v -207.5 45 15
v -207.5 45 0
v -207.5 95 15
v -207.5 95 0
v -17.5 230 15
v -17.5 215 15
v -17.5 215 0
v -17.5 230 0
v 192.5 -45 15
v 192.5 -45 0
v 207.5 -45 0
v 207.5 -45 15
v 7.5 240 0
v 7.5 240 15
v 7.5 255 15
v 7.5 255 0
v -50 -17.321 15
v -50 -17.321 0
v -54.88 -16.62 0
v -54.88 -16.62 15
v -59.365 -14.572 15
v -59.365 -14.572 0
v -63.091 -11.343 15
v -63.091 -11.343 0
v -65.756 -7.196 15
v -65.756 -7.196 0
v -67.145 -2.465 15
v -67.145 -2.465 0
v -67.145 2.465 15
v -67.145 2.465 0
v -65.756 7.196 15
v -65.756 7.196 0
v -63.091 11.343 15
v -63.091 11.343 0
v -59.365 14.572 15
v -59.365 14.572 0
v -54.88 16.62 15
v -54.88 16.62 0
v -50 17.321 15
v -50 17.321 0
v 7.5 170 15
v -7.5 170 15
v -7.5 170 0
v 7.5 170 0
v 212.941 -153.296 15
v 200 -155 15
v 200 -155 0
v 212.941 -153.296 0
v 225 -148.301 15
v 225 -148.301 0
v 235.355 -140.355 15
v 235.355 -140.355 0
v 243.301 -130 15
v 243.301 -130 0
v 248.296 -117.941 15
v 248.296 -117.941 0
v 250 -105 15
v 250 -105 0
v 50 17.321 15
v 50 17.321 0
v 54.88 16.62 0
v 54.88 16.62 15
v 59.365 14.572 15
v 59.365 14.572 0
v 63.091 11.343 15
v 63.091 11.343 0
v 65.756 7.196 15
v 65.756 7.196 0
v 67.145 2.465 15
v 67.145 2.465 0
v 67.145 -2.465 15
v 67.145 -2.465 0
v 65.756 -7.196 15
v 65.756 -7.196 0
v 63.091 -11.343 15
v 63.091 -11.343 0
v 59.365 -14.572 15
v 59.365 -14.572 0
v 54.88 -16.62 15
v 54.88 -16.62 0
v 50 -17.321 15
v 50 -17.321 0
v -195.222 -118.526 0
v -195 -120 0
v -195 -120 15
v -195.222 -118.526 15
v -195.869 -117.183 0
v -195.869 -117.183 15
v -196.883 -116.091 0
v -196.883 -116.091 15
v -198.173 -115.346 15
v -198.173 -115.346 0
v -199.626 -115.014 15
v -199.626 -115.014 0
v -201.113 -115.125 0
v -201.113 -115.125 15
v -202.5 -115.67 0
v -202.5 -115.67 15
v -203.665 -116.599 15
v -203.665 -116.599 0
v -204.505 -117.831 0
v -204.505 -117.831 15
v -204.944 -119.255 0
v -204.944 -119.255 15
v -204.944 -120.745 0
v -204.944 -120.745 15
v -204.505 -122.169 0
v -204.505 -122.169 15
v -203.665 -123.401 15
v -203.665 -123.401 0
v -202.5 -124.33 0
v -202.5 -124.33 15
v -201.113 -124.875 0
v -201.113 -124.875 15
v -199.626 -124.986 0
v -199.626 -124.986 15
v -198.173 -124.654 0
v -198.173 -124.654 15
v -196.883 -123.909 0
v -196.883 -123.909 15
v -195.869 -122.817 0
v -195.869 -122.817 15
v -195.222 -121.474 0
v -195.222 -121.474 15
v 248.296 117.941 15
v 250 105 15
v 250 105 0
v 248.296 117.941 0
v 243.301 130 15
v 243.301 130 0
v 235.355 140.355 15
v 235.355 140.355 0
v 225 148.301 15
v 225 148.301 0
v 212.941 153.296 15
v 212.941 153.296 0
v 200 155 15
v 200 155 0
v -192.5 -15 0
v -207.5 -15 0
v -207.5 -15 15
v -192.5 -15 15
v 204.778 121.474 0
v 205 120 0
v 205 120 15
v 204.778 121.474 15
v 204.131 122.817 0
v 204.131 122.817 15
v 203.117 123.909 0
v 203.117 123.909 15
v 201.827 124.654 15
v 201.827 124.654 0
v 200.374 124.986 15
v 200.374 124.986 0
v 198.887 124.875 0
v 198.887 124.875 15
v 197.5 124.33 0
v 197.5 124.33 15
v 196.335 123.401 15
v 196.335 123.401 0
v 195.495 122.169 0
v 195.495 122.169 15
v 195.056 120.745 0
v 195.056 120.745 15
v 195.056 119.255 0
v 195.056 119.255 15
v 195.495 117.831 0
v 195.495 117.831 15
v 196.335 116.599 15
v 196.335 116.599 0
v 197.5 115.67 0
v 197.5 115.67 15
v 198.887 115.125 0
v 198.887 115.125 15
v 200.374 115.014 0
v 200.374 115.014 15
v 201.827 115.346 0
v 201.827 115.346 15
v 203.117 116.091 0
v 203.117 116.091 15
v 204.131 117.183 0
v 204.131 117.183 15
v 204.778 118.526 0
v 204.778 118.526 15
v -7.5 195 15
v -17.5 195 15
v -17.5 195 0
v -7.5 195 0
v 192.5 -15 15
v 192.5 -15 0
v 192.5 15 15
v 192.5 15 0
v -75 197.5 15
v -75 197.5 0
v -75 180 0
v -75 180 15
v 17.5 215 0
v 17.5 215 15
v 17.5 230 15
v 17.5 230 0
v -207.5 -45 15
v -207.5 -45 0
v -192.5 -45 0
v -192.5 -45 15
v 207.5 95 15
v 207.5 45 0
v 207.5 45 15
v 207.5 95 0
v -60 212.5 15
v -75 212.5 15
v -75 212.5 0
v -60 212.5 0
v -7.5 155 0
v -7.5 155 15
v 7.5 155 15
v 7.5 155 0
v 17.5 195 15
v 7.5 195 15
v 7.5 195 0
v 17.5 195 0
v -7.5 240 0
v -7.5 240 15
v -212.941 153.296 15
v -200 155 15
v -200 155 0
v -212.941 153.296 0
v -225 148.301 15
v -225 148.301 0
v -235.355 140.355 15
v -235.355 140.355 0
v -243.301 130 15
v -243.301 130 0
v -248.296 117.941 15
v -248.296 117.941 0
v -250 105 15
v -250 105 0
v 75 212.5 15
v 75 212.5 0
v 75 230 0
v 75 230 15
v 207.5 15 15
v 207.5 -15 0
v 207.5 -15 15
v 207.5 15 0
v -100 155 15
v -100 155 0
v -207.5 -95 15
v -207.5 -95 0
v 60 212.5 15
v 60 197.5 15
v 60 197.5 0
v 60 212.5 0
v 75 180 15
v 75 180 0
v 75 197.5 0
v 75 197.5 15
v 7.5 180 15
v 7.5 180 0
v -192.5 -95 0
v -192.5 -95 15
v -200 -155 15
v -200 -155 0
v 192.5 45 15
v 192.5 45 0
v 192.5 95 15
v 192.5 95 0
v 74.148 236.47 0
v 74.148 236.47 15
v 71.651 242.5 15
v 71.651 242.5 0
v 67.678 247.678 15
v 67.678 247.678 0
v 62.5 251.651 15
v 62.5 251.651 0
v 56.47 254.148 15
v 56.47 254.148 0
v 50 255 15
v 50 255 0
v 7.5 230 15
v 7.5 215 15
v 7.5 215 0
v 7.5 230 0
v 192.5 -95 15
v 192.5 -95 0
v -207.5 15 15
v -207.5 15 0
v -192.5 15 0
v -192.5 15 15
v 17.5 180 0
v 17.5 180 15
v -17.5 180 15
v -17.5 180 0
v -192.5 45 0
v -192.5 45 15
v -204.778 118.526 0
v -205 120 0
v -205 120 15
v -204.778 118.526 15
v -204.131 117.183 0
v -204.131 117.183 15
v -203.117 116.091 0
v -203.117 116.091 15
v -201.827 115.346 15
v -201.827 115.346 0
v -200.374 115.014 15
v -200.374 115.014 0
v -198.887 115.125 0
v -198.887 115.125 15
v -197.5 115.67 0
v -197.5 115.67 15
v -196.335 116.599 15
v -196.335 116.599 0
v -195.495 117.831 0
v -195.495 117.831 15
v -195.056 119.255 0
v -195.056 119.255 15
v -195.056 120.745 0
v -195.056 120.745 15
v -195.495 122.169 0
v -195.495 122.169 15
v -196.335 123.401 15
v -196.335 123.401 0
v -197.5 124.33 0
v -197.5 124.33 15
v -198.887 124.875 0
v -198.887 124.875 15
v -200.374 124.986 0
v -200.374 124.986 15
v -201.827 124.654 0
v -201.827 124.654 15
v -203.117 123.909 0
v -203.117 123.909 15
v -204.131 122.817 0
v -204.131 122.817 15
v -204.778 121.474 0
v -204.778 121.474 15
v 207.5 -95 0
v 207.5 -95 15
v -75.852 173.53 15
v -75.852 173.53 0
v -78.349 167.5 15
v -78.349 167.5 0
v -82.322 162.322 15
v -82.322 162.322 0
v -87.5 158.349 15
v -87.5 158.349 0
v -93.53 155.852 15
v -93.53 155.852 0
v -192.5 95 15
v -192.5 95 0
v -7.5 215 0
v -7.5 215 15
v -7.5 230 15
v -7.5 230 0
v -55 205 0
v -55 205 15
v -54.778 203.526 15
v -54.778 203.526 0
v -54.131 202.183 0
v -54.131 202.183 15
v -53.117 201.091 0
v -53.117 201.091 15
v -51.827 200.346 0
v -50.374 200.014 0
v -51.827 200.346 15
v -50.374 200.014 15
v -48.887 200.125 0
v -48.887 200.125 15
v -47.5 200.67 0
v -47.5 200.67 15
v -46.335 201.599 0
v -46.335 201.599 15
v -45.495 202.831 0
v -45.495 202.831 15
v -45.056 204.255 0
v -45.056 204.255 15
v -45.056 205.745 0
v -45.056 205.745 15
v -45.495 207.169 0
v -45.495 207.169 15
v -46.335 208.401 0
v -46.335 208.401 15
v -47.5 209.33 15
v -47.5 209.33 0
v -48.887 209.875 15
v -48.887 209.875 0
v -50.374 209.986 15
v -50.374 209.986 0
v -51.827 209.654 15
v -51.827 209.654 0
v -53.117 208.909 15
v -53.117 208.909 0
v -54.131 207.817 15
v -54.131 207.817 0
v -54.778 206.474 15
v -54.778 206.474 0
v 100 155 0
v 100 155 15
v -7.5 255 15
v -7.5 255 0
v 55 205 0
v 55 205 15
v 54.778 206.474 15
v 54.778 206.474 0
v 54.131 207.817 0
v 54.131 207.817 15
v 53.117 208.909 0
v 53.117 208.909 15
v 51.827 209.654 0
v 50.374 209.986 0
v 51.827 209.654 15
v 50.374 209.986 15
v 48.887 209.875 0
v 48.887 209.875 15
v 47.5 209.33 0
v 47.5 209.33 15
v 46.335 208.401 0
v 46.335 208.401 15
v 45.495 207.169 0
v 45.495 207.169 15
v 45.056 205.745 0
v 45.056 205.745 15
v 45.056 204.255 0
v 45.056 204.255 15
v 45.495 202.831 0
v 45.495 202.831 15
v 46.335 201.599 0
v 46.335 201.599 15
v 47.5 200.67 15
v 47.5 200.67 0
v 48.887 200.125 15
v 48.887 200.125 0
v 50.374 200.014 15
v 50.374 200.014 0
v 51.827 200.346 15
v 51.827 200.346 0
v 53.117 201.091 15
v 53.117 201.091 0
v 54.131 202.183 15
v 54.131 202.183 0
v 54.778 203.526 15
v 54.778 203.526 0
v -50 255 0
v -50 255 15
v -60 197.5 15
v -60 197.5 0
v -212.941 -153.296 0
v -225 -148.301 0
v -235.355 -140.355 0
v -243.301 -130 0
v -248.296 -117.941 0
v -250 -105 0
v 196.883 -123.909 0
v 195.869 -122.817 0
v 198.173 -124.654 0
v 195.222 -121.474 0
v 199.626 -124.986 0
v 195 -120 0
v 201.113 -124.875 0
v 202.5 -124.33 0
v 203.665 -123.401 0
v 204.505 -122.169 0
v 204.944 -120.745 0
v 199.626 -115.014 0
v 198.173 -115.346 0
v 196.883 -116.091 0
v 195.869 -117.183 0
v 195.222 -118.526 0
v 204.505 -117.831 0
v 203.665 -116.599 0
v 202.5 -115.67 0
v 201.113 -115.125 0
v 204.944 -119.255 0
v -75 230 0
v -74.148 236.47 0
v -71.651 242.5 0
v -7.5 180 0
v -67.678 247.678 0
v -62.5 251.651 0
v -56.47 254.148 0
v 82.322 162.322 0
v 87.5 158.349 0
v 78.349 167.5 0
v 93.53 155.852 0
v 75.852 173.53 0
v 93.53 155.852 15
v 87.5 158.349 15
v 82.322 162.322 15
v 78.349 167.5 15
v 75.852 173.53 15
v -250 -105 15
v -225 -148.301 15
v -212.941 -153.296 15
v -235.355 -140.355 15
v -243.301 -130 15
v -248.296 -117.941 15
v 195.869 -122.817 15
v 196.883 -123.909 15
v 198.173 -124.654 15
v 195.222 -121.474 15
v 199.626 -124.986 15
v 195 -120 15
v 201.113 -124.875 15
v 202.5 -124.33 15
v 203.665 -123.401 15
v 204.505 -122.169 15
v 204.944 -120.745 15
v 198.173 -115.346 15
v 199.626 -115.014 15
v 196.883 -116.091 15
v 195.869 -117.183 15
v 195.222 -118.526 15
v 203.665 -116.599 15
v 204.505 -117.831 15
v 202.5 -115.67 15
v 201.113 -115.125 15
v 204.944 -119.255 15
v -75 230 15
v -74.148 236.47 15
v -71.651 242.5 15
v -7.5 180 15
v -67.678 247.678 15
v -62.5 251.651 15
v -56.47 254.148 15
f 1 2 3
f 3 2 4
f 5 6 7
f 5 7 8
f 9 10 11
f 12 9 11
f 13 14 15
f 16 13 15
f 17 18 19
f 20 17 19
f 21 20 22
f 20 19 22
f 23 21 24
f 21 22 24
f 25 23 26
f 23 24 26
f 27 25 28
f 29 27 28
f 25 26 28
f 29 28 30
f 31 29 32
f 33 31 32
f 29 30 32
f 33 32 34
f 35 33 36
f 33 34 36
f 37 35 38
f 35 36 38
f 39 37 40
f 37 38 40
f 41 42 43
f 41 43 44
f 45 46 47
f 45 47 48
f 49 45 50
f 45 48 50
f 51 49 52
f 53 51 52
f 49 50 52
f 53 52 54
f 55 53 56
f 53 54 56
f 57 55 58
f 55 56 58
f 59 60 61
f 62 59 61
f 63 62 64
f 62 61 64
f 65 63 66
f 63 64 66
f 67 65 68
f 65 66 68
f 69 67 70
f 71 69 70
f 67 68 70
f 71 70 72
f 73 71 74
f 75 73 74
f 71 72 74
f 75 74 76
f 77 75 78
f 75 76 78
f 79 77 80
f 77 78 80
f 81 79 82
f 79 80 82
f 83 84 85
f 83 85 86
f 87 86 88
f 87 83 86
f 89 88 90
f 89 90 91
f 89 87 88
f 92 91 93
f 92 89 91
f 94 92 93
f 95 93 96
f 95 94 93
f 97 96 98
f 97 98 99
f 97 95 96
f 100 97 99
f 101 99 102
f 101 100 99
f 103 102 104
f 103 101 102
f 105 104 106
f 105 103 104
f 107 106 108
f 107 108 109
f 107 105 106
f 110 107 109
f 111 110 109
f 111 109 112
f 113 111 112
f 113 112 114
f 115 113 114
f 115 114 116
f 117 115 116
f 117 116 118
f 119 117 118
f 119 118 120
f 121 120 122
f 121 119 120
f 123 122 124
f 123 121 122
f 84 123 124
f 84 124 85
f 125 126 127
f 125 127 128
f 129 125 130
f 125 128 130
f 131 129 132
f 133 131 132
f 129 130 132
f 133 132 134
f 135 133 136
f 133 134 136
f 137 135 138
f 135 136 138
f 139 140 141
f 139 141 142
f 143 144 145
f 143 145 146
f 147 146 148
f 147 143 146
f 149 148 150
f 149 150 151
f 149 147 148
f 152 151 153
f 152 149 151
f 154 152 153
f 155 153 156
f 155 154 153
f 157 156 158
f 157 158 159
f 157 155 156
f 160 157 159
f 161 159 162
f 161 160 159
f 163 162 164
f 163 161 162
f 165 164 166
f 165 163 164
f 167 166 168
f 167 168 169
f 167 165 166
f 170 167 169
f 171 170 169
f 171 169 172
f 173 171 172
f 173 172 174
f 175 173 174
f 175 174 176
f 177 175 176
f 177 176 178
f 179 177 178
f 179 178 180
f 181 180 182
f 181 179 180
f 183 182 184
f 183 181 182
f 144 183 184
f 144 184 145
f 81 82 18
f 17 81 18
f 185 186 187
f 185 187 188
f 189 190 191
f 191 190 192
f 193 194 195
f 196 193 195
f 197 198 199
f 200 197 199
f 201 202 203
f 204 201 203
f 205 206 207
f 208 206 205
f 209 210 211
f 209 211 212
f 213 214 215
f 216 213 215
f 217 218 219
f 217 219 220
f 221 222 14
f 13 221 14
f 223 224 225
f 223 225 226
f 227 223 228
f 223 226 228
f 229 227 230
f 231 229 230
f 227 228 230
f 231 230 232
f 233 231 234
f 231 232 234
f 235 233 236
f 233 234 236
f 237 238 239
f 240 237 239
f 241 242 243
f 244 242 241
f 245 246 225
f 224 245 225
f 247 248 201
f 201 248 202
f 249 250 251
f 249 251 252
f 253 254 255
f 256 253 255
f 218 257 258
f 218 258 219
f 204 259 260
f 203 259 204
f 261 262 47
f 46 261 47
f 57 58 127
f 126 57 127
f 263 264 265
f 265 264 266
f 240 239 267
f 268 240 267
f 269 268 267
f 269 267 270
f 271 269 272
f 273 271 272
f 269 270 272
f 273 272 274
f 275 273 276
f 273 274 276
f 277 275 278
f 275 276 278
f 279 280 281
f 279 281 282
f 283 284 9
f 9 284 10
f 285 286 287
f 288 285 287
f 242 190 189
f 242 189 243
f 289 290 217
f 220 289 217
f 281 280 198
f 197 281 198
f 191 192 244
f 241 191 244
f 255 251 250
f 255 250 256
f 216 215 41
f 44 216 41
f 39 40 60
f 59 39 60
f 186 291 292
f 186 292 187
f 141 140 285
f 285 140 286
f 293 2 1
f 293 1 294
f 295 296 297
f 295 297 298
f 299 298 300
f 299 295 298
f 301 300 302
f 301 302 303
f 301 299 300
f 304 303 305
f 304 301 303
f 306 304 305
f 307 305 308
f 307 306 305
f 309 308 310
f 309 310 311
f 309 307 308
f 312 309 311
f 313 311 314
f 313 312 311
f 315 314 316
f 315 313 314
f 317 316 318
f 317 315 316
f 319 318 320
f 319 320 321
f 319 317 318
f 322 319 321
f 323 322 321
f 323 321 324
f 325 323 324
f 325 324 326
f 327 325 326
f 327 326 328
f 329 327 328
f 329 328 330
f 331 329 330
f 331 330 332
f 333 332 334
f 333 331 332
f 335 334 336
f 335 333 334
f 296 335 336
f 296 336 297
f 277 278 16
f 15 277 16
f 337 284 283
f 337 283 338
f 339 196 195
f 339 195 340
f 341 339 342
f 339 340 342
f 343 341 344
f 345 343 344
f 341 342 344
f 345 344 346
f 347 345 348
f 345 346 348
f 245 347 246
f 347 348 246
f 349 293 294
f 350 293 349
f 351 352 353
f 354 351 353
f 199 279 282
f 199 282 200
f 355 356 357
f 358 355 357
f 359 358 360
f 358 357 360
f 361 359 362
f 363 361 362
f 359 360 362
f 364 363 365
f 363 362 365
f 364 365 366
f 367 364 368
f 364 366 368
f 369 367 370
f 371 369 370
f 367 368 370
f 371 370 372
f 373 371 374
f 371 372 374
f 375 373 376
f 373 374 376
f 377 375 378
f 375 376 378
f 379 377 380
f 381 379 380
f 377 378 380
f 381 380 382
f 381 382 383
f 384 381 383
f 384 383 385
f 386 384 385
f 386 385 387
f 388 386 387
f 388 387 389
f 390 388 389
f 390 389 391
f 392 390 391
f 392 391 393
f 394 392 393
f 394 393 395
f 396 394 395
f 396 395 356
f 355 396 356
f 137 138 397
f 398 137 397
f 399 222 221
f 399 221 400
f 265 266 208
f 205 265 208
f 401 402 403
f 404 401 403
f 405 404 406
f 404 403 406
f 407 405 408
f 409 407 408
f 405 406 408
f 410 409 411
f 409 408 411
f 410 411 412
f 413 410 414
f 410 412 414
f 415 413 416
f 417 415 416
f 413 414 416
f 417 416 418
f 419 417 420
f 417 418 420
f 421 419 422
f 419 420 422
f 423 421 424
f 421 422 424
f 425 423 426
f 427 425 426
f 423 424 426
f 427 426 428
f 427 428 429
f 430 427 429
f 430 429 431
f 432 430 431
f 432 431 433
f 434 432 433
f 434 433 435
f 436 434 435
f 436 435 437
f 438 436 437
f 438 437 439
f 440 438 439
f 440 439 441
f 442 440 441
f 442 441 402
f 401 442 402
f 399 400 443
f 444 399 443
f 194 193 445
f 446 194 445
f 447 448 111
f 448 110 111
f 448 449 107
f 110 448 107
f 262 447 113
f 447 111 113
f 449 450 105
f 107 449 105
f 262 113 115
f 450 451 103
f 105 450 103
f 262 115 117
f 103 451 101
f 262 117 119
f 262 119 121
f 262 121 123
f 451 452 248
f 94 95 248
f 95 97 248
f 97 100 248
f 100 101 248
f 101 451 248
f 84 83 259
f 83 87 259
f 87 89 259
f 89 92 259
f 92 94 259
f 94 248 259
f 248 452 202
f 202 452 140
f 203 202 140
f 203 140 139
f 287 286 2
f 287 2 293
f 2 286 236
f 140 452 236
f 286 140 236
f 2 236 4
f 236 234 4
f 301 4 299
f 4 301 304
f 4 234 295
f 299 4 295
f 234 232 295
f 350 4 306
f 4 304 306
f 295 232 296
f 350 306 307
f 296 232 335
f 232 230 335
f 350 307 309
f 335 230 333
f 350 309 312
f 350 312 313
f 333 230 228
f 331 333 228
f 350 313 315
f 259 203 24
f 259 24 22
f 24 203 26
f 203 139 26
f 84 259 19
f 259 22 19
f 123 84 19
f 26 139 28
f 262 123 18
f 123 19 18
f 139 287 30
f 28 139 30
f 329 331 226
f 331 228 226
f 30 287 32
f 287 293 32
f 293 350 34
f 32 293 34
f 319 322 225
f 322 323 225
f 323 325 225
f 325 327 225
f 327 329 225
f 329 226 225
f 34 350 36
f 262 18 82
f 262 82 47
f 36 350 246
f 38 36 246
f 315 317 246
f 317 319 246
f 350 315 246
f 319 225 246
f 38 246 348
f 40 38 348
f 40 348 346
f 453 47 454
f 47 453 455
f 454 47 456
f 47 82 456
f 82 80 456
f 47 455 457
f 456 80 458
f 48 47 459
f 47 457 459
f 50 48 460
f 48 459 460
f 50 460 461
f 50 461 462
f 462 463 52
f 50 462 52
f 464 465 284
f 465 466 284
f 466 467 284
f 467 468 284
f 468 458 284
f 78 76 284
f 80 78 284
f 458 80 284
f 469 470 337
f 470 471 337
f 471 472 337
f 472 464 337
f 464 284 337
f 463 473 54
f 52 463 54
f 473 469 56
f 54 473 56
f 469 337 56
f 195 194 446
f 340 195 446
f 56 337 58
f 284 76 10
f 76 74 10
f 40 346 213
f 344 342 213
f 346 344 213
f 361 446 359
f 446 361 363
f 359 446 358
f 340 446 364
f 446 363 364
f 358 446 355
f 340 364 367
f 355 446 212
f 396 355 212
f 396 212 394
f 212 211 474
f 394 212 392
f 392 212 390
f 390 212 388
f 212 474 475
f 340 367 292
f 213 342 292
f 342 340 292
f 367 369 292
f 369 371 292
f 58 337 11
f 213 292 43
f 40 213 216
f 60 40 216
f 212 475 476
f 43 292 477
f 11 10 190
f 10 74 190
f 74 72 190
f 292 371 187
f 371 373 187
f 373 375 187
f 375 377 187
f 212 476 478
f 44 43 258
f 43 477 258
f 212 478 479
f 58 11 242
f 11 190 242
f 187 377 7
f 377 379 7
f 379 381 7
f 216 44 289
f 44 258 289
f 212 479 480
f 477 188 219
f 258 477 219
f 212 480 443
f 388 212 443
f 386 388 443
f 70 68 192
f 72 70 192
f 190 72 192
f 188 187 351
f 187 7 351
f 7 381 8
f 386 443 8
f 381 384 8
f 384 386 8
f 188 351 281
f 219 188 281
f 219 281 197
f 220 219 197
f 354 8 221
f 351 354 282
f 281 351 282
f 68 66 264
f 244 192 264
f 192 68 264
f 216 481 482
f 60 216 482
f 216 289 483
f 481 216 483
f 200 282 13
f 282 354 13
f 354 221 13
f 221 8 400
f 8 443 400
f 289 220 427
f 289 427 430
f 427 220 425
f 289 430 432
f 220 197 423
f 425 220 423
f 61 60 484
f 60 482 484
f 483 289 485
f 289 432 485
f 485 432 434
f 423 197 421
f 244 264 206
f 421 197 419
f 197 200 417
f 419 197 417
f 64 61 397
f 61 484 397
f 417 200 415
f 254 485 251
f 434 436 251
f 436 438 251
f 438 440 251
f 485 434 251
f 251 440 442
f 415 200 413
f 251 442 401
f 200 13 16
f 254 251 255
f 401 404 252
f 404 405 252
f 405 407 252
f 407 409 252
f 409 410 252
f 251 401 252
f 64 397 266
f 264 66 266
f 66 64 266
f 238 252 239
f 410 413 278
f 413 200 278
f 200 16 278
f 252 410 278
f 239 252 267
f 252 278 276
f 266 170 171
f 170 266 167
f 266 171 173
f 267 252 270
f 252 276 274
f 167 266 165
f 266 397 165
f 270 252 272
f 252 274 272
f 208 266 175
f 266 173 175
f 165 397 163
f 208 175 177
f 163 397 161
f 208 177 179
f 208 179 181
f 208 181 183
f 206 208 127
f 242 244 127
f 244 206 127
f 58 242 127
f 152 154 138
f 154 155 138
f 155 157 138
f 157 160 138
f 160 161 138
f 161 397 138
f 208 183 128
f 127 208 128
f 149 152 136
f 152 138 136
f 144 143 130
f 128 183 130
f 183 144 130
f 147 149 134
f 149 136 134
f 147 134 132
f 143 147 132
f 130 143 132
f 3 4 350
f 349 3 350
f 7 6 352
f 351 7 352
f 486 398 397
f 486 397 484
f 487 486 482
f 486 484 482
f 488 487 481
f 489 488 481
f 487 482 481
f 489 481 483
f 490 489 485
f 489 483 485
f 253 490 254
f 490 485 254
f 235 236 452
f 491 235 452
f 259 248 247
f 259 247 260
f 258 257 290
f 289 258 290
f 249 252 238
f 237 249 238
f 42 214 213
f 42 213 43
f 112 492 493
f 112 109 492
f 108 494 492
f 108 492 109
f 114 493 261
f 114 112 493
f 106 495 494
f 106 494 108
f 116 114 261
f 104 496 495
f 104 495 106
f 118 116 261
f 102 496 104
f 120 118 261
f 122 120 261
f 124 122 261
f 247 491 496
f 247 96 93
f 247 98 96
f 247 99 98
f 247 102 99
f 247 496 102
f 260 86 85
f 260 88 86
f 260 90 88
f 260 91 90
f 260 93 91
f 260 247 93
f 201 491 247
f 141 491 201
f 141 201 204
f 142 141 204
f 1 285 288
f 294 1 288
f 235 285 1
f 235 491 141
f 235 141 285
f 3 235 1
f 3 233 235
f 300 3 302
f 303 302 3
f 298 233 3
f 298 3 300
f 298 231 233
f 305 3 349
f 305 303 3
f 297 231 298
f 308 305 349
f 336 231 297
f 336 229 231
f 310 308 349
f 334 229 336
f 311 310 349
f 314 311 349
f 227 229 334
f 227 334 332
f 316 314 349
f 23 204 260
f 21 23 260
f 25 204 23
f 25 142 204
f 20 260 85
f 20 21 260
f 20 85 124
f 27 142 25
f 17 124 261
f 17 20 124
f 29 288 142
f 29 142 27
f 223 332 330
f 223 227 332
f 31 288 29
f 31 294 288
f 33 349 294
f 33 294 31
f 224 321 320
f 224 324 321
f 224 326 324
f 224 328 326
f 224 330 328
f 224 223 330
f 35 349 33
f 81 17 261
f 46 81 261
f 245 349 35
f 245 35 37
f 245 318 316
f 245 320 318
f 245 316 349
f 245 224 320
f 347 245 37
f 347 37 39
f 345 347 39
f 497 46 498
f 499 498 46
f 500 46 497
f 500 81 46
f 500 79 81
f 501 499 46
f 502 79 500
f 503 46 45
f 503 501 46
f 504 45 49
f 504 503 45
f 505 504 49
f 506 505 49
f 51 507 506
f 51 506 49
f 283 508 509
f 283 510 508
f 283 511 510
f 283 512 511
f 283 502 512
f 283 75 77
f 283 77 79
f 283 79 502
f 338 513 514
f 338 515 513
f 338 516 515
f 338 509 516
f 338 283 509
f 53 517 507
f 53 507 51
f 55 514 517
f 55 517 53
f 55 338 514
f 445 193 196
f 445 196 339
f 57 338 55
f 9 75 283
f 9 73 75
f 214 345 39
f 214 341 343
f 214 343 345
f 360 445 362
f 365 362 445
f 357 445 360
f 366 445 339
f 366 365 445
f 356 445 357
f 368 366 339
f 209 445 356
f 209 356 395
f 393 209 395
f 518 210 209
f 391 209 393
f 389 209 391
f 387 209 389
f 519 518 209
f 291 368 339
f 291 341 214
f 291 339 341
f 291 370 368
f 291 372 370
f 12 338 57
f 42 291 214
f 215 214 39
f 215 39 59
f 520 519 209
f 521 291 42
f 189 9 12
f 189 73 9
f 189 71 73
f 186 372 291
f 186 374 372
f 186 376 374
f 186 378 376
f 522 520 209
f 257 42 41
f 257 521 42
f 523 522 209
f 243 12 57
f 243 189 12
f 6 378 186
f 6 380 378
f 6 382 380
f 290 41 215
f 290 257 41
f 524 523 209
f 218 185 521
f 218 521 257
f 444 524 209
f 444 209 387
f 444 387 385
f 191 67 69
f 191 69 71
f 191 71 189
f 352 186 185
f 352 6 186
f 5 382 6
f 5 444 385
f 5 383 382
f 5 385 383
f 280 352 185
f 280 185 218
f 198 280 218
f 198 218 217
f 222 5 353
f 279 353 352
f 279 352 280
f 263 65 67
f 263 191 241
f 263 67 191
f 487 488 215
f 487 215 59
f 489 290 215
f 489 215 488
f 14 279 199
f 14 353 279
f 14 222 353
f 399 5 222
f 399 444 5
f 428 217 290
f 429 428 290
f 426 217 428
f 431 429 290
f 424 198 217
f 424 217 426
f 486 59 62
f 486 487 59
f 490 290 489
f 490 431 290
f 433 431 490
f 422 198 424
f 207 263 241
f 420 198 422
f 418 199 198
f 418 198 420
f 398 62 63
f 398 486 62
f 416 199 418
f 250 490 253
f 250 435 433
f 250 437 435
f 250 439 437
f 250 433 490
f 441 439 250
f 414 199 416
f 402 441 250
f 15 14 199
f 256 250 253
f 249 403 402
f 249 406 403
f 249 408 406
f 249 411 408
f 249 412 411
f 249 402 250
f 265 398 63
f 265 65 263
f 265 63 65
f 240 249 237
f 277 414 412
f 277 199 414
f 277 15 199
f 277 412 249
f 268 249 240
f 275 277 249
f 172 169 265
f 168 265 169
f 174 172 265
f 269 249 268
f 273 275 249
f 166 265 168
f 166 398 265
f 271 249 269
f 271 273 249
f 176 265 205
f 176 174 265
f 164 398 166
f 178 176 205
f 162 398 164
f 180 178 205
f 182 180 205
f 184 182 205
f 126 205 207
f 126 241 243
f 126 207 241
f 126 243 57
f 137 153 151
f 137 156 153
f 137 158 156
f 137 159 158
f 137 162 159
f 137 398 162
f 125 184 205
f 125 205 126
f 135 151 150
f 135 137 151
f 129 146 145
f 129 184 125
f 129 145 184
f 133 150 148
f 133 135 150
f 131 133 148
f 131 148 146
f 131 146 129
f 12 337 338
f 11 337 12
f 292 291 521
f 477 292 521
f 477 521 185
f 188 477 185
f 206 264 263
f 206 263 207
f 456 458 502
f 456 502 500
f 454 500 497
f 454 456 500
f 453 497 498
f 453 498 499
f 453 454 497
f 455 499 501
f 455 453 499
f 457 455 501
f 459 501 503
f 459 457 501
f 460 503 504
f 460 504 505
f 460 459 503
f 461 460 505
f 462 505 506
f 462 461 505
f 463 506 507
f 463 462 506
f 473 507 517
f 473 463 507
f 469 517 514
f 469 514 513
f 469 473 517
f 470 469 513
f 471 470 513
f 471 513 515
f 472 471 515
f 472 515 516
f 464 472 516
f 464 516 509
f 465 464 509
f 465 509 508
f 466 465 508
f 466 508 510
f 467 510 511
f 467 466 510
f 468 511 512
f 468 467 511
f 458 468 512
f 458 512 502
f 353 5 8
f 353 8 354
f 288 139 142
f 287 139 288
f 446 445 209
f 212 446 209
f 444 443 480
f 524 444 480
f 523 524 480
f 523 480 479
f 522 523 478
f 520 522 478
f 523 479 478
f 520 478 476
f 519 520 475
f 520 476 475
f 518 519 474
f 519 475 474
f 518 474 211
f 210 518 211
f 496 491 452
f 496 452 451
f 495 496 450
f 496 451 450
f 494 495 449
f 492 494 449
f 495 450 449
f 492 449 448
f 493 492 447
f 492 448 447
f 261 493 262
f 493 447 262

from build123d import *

# Parameters (mm, degrees)
ESQUISSE1_R             = 5
ESQUISSE1_W             = 15
ESQUISSE1_H             = 30
ESQUISSE1_H_2           = 50
BOSS_EXTRU_1_DEPTH      = 15
ESQUISSE2_R             = 5
ESQUISSE2_W             = 34.887872932
ESQUISSE2_H             = 15
ESQUISSE2_W_2           = 15
ESQUISSE2_W_3           = 10
ENL_V_MAT_EXTRU_1_DEPTH = 358.421320013


with BuildPart() as part:
    # Esquisse1 → Boss.-Extru.1 (new body)
    with BuildSketch(Plane.XY):
        with BuildLine():
            Line((-200, -155), (200, -155))
            ThreePointArc((200, -155), (235.355339059, -140.355339059), (250, -105))
            Line((250, -105), (250, 105))
            ThreePointArc((250, 105), (235.355339059, 140.355339059), (200, 155))
            Line((200, 155), (100, 155))
            ThreePointArc((100, 155), (82.32233047, 162.32233047), (75, 180))
            Line((75, 180), (75, 230))
            ThreePointArc((75, 230), (67.67766953, 247.67766953), (50, 255))
            Line((50, 255), (-50, 255))
            ThreePointArc((-50, 255), (-67.67766953, 247.67766953), (-75, 230))
            Line((-75, 230), (-75, 180))
            ThreePointArc((-75, 180), (-82.32233047, 162.32233047), (-100, 155))
            Line((-100, 155), (-200, 155))
            ThreePointArc((-200, 155), (-235.355339059, 140.355339059), (-250, 105))
            Line((-250, 105), (-250, -105))
            ThreePointArc((-250, -105), (-235.355339059, -140.355339059), (-200, -155))
        make_face()
        with Locations((200, 120)):
            Circle(ESQUISSE1_R, mode=Mode.SUBTRACT)
        with Locations(Location((200, -120, 0), (0, 0, 180))):
            Circle(ESQUISSE1_R, mode=Mode.SUBTRACT)
        with Locations((-200, -120)):
            Circle(ESQUISSE1_R, mode=Mode.SUBTRACT)
        with Locations(Location((-200, 120, 0), (0, 0, 180))):
            Circle(ESQUISSE1_R, mode=Mode.SUBTRACT)
        with Locations((200, 0)):
            Rectangle(ESQUISSE1_W, ESQUISSE1_H, mode=Mode.SUBTRACT)
        with Locations((200, 70)):
            Rectangle(ESQUISSE1_W, ESQUISSE1_H_2, mode=Mode.SUBTRACT)
        with Locations((200, -70)):
            Rectangle(ESQUISSE1_W, ESQUISSE1_H_2, mode=Mode.SUBTRACT)
        with Locations((-200, -70)):
            Rectangle(ESQUISSE1_W, ESQUISSE1_H_2, mode=Mode.SUBTRACT)
        with Locations((-200, 0)):
            Rectangle(ESQUISSE1_W, ESQUISSE1_H, mode=Mode.SUBTRACT)
        with Locations((-200, 70)):
            Rectangle(ESQUISSE1_W, ESQUISSE1_H_2, mode=Mode.SUBTRACT)
        with BuildLine():
            Line((50, -17.321312087), (-50, -17.321312087))
            ThreePointArc((-50, -17.321312087), (-67.321312087, 0), (-50, 17.321312087))
            Line((-50, 17.321312087), (50, 17.321312087))
            ThreePointArc((50, 17.321312087), (67.321312087, 0), (50, -17.321312087))
        make_face(mode=Mode.SUBTRACT)
    extrude(amount=BOSS_EXTRU_1_DEPTH)

    # Esquisse2 → Enlèv. mat.-Extru.1 (cut, through all)
    with BuildSketch(Plane.XY.offset(15)):
        with Locations((50, 205)):
            Circle(ESQUISSE2_R)
        with Locations(Location((-50, 205, 0), (0, 0, 180))):
            Circle(ESQUISSE2_R)
        with Locations((77.443936466, 205)):
            Rectangle(ESQUISSE2_W, ESQUISSE2_H)
        with Locations((0, 247.5)):
            Rectangle(ESQUISSE2_W_2, ESQUISSE2_H)
        with Locations((-77.443936466, 205)):
            Rectangle(ESQUISSE2_W, ESQUISSE2_H)
        with Locations((0, 162.5)):
            Rectangle(ESQUISSE2_W_2, ESQUISSE2_H)
        with Locations((12.5, 222.5)):
            Rectangle(ESQUISSE2_W_3, ESQUISSE2_H)
        with Locations((-12.5, 222.5)):
            Rectangle(ESQUISSE2_W_3, ESQUISSE2_H)
        with Locations((12.5, 187.5)):
            Rectangle(ESQUISSE2_W_3, ESQUISSE2_H)
        with Locations((-12.5, 187.5)):
            Rectangle(ESQUISSE2_W_3, ESQUISSE2_H)
    extrude(amount=-ENL_V_MAT_EXTRU_1_DEPTH, mode=Mode.SUBTRACT)


solid = part.part
